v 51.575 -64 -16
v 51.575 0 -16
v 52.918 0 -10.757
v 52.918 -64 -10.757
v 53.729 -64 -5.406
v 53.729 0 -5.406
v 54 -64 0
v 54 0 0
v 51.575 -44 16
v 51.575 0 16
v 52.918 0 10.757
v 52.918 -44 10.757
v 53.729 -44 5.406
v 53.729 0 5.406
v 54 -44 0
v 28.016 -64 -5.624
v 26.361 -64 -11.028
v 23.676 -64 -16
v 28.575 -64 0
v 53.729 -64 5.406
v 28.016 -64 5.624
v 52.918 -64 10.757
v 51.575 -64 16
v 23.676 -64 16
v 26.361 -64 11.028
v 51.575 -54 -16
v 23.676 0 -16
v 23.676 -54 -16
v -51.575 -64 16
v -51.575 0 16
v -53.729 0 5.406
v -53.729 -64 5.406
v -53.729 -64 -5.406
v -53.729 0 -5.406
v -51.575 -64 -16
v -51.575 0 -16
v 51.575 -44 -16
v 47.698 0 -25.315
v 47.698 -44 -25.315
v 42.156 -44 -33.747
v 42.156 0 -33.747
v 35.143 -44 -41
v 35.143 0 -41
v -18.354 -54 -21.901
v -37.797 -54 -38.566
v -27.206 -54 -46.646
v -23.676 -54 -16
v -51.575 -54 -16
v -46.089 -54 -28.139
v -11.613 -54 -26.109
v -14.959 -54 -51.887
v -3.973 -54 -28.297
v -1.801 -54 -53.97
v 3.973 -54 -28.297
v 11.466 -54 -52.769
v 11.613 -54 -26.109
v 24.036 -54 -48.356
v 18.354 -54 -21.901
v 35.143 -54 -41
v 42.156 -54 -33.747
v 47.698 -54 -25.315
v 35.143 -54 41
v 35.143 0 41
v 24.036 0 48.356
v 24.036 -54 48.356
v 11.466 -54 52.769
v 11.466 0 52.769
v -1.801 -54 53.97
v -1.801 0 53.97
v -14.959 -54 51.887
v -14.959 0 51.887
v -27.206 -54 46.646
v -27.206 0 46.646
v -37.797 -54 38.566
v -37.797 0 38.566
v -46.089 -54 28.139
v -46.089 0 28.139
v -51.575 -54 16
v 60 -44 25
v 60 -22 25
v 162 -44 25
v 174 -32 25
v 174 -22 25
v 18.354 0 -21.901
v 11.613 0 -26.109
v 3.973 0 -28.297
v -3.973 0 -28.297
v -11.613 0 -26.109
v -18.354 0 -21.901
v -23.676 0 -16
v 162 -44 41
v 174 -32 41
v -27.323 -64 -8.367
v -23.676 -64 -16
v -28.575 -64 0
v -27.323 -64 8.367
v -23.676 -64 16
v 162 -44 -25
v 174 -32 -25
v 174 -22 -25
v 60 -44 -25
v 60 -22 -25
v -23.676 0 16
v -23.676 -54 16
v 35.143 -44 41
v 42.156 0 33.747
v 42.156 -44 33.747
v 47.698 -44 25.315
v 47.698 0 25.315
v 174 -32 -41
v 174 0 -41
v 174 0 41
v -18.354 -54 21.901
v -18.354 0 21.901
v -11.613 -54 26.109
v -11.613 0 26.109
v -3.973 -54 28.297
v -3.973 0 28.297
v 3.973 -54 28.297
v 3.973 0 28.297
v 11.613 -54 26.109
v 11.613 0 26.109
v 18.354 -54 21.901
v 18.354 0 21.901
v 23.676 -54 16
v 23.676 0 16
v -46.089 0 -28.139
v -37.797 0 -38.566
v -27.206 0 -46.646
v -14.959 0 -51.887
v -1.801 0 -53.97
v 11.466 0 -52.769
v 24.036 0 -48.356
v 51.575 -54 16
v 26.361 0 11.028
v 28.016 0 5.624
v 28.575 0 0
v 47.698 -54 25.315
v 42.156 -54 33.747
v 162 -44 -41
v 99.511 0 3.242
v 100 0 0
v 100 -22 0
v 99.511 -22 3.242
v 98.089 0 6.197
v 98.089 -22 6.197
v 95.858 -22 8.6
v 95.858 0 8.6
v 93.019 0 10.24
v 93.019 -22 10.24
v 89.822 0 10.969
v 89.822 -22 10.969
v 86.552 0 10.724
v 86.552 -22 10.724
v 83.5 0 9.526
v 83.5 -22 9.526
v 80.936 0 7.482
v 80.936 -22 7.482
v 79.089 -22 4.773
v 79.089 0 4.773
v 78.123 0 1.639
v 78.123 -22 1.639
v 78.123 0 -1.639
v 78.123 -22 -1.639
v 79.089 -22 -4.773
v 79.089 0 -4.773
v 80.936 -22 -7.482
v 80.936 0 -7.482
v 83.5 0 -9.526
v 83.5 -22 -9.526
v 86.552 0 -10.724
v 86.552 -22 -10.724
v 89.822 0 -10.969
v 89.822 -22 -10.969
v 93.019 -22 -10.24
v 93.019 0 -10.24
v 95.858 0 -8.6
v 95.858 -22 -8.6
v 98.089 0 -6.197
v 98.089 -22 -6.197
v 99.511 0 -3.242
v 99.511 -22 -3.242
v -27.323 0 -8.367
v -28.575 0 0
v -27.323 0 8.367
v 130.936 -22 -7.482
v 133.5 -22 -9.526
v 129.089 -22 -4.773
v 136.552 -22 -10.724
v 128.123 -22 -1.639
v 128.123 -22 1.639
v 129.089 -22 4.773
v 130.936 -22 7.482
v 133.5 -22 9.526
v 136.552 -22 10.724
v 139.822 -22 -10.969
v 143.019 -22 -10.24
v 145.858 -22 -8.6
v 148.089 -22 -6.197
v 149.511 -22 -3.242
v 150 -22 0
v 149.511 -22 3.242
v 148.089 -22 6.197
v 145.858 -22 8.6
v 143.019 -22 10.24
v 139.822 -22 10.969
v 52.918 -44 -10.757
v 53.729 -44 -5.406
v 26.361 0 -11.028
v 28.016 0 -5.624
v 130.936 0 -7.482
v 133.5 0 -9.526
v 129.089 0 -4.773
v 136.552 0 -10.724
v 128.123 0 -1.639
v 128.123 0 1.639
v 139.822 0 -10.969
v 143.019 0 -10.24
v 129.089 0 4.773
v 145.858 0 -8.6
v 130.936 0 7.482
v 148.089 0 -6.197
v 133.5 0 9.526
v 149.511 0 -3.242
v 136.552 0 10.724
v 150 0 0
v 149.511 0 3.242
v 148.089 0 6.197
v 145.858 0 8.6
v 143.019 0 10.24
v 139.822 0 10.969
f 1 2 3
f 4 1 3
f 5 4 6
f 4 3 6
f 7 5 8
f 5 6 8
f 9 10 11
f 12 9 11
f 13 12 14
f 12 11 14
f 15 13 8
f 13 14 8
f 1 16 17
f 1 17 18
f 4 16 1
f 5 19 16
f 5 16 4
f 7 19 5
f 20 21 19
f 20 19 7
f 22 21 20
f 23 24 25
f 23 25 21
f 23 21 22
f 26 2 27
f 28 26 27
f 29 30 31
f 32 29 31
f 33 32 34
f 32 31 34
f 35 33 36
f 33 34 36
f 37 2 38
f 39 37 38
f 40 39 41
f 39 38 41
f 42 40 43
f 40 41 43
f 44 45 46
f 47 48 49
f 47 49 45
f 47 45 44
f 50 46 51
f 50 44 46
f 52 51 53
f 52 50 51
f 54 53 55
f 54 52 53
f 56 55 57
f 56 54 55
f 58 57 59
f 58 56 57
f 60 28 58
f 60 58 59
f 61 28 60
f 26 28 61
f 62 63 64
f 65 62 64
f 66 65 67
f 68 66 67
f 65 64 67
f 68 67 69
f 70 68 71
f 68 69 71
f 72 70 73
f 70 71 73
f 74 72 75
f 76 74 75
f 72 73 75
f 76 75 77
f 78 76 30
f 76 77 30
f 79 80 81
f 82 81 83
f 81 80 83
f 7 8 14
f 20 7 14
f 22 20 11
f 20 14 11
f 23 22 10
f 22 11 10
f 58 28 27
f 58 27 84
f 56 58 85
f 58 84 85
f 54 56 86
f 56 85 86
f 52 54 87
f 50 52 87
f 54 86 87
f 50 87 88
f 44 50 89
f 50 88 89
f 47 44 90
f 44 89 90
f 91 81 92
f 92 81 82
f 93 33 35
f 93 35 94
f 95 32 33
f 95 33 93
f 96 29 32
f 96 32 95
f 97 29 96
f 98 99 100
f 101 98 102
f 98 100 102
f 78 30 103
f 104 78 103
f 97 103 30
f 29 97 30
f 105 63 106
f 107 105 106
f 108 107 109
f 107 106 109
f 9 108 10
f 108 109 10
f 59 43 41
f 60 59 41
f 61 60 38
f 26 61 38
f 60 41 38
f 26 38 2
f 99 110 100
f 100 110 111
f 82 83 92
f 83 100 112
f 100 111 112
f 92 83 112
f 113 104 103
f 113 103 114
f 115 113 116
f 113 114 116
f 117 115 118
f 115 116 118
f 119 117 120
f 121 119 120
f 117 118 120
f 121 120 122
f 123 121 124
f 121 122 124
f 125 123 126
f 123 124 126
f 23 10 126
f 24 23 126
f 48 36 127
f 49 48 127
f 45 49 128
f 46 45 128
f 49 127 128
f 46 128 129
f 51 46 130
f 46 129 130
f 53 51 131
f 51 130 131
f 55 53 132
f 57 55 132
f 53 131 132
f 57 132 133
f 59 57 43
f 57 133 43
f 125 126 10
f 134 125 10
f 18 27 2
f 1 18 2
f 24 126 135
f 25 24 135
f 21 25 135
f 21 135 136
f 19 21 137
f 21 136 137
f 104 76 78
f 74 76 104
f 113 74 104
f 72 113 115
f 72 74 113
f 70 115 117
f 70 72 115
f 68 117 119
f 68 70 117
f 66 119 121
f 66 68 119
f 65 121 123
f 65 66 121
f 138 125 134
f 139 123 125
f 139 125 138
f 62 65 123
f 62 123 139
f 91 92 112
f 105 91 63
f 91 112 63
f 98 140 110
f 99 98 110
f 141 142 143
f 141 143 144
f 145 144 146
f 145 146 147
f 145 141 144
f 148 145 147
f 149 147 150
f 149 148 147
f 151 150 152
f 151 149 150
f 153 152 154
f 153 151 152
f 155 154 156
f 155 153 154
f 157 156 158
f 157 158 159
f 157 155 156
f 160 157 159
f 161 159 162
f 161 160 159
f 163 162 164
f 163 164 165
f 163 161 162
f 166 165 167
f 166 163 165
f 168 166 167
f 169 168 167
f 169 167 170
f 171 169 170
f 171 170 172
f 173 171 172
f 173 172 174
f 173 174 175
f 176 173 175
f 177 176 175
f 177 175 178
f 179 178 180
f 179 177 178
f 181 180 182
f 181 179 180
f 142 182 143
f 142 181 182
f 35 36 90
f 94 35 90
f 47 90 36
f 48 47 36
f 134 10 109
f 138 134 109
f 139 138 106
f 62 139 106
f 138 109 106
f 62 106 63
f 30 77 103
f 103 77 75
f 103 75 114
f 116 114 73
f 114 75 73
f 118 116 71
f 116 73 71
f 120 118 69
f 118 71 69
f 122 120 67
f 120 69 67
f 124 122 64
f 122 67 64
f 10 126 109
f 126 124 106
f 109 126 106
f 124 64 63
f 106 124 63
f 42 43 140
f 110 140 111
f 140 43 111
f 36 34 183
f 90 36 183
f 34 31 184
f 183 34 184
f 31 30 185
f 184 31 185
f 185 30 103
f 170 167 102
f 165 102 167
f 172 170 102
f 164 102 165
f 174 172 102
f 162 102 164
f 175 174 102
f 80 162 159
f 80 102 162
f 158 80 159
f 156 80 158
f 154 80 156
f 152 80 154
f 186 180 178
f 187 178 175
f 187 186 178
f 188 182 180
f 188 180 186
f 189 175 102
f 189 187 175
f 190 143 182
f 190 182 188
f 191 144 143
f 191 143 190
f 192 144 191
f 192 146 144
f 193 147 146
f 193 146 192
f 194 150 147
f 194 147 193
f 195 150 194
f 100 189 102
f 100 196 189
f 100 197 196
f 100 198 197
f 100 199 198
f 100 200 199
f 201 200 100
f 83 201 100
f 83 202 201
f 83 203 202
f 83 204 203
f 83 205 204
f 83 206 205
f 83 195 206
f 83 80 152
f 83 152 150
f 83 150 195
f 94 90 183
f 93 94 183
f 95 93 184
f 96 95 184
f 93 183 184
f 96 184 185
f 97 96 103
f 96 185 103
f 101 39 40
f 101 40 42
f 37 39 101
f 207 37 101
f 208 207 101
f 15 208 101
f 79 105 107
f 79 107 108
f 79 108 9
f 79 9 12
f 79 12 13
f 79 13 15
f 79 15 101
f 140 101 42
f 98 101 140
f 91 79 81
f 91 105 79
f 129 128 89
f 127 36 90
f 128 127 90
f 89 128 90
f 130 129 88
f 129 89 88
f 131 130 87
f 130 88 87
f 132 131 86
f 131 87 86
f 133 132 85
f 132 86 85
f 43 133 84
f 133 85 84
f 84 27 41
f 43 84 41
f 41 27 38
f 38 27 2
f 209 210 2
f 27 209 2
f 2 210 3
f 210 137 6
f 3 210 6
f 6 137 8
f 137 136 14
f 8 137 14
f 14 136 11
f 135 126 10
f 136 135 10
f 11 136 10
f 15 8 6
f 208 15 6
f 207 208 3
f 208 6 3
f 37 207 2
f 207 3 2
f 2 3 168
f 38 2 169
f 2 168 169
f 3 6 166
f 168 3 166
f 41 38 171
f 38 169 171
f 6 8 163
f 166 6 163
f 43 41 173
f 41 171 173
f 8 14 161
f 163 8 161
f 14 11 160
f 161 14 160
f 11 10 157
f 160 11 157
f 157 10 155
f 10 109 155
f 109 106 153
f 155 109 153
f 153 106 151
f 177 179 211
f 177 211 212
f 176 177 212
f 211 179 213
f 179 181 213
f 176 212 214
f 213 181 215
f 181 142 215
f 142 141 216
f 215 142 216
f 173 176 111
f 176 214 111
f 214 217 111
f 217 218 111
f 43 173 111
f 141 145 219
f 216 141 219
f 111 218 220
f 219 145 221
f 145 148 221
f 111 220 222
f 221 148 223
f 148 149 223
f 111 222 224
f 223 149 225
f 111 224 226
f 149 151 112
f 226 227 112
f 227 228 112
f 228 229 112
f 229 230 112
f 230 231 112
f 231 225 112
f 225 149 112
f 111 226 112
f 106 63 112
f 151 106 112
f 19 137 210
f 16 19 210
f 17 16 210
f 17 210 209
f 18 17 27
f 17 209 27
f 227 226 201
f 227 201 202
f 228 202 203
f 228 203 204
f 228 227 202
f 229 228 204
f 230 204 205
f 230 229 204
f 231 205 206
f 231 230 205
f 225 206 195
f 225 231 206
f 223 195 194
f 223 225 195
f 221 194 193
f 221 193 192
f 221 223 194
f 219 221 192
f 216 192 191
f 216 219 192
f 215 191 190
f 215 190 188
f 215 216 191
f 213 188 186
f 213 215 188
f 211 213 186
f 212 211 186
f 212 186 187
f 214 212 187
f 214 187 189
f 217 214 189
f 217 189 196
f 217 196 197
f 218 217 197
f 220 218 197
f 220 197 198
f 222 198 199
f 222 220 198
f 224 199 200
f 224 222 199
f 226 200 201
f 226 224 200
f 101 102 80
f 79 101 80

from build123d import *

# Parameters (mm, degrees)
F1_DEPTH = 54
F2_DEPTH = 64
F3_DEPTH = 44
F0_W     = 114
F0_H     = 50
F0_R     = 11
F4_DEPTH = 22
F6_DEPTH = 95.001


with BuildPart() as f1:
    # F0 (on Front) → F1 (new body)
    with BuildSketch(Plane.XZ):
        with BuildLine():
            Line((23.675528, 16), (51.575188, 16))
            ThreePointArc((51.575188, 16), (45.124741, 29.660711), (35.142567, 41))
            ThreePointArc((35.142567, 41), (-14.958535, 51.886821), (-51.575188, 16))
            Line((-51.575188, 16), (-23.675528, 16))
            ThreePointArc((-23.675528, 16), (0, 28.575), (23.675528, 16))
        make_face()
        with BuildLine():
            ThreePointArc((35.142567, -41), (45.124741, -29.660711), (51.575188, -16))
            Line((51.575188, -16), (23.675528, -16))
            ThreePointArc((23.675528, -16), (0, -28.575), (-23.675528, -16))
            Line((-23.675528, -16), (-51.575188, -16))
            ThreePointArc((-51.575188, -16), (-14.958535, -51.886821), (35.142567, -41))
        make_face()
    extrude(amount=F1_DEPTH)


with BuildPart() as f2:
    # F0 (on Front) → F2 (new body)
    with BuildSketch(Plane.XZ):
        with BuildLine():
            Line((-23.675528, 16), (-51.575188, 16))
            ThreePointArc((-51.575188, 16), (-54, 0), (-51.575188, -16))
            Line((-51.575188, -16), (-23.675528, -16))
            ThreePointArc((-23.675528, -16), (-28.575, 0), (-23.675528, 16))
        make_face()
        with BuildLine():
            ThreePointArc((51.575188, -16), (53.390356, -8.091349), (54, 0))
            ThreePointArc((54, 0), (53.390356, 8.091349), (51.575188, 16))
            Line((51.575188, 16), (23.675528, 16))
            ThreePointArc((23.675528, 16), (27.322691, 8.366672), (28.575, 0))
            ThreePointArc((28.575, 0), (27.322691, -8.366672), (23.675528, -16))
            Line((23.675528, -16), (51.575188, -16))
        make_face()
    extrude(amount=F2_DEPTH)


with BuildPart() as f3:
    # F0 (on Front) → F3 (new body)
    with BuildSketch(Plane.XZ):
        with BuildLine():
            ThreePointArc((51.575188, 16), (53.390356, 8.091349), (54, 0))
            ThreePointArc((54, 0), (53.390356, -8.091349), (51.575188, -16))
            ThreePointArc((51.575188, -16), (45.124741, -29.660711), (35.142567, -41))
            Line((35.142567, -41), (174, -41))
            Line((174, -41), (174, -25))
            Line((174, -25), (60, -25))
            Line((60, -25), (60, 25))
            Line((60, 25), (174, 25))
            Line((174, 25), (174, 41))
            Line((174, 41), (35.142567, 41))
            ThreePointArc((35.142567, 41), (45.124741, 29.660711), (51.575188, 16))
        make_face()
    extrude(amount=F3_DEPTH)

    # F0 (on Front) → F4 (join)
    with BuildSketch(Plane.XZ):
        with Locations((117, 0)):
            Rectangle(F0_W, F0_H)
        with Locations((89, 0)):
            Circle(F0_R, mode=Mode.SUBTRACT)
        with Locations((139, 0)):
            Circle(F0_R, mode=Mode.SUBTRACT)
    extrude(amount=F4_DEPTH)

    # F5 (on face) → F6 (cut, through all)
    with BuildSketch(Plane(origin=(0, 0, -41), x_dir=(1, 0, 0), z_dir=(0, 0, -1))):
        Polygon((174, 44), (162, 44), (174, 32), align=None)
    extrude(amount=-F6_DEPTH, mode=Mode.SUBTRACT)


solid = Compound([f1.part, f2.part, f3.part])
